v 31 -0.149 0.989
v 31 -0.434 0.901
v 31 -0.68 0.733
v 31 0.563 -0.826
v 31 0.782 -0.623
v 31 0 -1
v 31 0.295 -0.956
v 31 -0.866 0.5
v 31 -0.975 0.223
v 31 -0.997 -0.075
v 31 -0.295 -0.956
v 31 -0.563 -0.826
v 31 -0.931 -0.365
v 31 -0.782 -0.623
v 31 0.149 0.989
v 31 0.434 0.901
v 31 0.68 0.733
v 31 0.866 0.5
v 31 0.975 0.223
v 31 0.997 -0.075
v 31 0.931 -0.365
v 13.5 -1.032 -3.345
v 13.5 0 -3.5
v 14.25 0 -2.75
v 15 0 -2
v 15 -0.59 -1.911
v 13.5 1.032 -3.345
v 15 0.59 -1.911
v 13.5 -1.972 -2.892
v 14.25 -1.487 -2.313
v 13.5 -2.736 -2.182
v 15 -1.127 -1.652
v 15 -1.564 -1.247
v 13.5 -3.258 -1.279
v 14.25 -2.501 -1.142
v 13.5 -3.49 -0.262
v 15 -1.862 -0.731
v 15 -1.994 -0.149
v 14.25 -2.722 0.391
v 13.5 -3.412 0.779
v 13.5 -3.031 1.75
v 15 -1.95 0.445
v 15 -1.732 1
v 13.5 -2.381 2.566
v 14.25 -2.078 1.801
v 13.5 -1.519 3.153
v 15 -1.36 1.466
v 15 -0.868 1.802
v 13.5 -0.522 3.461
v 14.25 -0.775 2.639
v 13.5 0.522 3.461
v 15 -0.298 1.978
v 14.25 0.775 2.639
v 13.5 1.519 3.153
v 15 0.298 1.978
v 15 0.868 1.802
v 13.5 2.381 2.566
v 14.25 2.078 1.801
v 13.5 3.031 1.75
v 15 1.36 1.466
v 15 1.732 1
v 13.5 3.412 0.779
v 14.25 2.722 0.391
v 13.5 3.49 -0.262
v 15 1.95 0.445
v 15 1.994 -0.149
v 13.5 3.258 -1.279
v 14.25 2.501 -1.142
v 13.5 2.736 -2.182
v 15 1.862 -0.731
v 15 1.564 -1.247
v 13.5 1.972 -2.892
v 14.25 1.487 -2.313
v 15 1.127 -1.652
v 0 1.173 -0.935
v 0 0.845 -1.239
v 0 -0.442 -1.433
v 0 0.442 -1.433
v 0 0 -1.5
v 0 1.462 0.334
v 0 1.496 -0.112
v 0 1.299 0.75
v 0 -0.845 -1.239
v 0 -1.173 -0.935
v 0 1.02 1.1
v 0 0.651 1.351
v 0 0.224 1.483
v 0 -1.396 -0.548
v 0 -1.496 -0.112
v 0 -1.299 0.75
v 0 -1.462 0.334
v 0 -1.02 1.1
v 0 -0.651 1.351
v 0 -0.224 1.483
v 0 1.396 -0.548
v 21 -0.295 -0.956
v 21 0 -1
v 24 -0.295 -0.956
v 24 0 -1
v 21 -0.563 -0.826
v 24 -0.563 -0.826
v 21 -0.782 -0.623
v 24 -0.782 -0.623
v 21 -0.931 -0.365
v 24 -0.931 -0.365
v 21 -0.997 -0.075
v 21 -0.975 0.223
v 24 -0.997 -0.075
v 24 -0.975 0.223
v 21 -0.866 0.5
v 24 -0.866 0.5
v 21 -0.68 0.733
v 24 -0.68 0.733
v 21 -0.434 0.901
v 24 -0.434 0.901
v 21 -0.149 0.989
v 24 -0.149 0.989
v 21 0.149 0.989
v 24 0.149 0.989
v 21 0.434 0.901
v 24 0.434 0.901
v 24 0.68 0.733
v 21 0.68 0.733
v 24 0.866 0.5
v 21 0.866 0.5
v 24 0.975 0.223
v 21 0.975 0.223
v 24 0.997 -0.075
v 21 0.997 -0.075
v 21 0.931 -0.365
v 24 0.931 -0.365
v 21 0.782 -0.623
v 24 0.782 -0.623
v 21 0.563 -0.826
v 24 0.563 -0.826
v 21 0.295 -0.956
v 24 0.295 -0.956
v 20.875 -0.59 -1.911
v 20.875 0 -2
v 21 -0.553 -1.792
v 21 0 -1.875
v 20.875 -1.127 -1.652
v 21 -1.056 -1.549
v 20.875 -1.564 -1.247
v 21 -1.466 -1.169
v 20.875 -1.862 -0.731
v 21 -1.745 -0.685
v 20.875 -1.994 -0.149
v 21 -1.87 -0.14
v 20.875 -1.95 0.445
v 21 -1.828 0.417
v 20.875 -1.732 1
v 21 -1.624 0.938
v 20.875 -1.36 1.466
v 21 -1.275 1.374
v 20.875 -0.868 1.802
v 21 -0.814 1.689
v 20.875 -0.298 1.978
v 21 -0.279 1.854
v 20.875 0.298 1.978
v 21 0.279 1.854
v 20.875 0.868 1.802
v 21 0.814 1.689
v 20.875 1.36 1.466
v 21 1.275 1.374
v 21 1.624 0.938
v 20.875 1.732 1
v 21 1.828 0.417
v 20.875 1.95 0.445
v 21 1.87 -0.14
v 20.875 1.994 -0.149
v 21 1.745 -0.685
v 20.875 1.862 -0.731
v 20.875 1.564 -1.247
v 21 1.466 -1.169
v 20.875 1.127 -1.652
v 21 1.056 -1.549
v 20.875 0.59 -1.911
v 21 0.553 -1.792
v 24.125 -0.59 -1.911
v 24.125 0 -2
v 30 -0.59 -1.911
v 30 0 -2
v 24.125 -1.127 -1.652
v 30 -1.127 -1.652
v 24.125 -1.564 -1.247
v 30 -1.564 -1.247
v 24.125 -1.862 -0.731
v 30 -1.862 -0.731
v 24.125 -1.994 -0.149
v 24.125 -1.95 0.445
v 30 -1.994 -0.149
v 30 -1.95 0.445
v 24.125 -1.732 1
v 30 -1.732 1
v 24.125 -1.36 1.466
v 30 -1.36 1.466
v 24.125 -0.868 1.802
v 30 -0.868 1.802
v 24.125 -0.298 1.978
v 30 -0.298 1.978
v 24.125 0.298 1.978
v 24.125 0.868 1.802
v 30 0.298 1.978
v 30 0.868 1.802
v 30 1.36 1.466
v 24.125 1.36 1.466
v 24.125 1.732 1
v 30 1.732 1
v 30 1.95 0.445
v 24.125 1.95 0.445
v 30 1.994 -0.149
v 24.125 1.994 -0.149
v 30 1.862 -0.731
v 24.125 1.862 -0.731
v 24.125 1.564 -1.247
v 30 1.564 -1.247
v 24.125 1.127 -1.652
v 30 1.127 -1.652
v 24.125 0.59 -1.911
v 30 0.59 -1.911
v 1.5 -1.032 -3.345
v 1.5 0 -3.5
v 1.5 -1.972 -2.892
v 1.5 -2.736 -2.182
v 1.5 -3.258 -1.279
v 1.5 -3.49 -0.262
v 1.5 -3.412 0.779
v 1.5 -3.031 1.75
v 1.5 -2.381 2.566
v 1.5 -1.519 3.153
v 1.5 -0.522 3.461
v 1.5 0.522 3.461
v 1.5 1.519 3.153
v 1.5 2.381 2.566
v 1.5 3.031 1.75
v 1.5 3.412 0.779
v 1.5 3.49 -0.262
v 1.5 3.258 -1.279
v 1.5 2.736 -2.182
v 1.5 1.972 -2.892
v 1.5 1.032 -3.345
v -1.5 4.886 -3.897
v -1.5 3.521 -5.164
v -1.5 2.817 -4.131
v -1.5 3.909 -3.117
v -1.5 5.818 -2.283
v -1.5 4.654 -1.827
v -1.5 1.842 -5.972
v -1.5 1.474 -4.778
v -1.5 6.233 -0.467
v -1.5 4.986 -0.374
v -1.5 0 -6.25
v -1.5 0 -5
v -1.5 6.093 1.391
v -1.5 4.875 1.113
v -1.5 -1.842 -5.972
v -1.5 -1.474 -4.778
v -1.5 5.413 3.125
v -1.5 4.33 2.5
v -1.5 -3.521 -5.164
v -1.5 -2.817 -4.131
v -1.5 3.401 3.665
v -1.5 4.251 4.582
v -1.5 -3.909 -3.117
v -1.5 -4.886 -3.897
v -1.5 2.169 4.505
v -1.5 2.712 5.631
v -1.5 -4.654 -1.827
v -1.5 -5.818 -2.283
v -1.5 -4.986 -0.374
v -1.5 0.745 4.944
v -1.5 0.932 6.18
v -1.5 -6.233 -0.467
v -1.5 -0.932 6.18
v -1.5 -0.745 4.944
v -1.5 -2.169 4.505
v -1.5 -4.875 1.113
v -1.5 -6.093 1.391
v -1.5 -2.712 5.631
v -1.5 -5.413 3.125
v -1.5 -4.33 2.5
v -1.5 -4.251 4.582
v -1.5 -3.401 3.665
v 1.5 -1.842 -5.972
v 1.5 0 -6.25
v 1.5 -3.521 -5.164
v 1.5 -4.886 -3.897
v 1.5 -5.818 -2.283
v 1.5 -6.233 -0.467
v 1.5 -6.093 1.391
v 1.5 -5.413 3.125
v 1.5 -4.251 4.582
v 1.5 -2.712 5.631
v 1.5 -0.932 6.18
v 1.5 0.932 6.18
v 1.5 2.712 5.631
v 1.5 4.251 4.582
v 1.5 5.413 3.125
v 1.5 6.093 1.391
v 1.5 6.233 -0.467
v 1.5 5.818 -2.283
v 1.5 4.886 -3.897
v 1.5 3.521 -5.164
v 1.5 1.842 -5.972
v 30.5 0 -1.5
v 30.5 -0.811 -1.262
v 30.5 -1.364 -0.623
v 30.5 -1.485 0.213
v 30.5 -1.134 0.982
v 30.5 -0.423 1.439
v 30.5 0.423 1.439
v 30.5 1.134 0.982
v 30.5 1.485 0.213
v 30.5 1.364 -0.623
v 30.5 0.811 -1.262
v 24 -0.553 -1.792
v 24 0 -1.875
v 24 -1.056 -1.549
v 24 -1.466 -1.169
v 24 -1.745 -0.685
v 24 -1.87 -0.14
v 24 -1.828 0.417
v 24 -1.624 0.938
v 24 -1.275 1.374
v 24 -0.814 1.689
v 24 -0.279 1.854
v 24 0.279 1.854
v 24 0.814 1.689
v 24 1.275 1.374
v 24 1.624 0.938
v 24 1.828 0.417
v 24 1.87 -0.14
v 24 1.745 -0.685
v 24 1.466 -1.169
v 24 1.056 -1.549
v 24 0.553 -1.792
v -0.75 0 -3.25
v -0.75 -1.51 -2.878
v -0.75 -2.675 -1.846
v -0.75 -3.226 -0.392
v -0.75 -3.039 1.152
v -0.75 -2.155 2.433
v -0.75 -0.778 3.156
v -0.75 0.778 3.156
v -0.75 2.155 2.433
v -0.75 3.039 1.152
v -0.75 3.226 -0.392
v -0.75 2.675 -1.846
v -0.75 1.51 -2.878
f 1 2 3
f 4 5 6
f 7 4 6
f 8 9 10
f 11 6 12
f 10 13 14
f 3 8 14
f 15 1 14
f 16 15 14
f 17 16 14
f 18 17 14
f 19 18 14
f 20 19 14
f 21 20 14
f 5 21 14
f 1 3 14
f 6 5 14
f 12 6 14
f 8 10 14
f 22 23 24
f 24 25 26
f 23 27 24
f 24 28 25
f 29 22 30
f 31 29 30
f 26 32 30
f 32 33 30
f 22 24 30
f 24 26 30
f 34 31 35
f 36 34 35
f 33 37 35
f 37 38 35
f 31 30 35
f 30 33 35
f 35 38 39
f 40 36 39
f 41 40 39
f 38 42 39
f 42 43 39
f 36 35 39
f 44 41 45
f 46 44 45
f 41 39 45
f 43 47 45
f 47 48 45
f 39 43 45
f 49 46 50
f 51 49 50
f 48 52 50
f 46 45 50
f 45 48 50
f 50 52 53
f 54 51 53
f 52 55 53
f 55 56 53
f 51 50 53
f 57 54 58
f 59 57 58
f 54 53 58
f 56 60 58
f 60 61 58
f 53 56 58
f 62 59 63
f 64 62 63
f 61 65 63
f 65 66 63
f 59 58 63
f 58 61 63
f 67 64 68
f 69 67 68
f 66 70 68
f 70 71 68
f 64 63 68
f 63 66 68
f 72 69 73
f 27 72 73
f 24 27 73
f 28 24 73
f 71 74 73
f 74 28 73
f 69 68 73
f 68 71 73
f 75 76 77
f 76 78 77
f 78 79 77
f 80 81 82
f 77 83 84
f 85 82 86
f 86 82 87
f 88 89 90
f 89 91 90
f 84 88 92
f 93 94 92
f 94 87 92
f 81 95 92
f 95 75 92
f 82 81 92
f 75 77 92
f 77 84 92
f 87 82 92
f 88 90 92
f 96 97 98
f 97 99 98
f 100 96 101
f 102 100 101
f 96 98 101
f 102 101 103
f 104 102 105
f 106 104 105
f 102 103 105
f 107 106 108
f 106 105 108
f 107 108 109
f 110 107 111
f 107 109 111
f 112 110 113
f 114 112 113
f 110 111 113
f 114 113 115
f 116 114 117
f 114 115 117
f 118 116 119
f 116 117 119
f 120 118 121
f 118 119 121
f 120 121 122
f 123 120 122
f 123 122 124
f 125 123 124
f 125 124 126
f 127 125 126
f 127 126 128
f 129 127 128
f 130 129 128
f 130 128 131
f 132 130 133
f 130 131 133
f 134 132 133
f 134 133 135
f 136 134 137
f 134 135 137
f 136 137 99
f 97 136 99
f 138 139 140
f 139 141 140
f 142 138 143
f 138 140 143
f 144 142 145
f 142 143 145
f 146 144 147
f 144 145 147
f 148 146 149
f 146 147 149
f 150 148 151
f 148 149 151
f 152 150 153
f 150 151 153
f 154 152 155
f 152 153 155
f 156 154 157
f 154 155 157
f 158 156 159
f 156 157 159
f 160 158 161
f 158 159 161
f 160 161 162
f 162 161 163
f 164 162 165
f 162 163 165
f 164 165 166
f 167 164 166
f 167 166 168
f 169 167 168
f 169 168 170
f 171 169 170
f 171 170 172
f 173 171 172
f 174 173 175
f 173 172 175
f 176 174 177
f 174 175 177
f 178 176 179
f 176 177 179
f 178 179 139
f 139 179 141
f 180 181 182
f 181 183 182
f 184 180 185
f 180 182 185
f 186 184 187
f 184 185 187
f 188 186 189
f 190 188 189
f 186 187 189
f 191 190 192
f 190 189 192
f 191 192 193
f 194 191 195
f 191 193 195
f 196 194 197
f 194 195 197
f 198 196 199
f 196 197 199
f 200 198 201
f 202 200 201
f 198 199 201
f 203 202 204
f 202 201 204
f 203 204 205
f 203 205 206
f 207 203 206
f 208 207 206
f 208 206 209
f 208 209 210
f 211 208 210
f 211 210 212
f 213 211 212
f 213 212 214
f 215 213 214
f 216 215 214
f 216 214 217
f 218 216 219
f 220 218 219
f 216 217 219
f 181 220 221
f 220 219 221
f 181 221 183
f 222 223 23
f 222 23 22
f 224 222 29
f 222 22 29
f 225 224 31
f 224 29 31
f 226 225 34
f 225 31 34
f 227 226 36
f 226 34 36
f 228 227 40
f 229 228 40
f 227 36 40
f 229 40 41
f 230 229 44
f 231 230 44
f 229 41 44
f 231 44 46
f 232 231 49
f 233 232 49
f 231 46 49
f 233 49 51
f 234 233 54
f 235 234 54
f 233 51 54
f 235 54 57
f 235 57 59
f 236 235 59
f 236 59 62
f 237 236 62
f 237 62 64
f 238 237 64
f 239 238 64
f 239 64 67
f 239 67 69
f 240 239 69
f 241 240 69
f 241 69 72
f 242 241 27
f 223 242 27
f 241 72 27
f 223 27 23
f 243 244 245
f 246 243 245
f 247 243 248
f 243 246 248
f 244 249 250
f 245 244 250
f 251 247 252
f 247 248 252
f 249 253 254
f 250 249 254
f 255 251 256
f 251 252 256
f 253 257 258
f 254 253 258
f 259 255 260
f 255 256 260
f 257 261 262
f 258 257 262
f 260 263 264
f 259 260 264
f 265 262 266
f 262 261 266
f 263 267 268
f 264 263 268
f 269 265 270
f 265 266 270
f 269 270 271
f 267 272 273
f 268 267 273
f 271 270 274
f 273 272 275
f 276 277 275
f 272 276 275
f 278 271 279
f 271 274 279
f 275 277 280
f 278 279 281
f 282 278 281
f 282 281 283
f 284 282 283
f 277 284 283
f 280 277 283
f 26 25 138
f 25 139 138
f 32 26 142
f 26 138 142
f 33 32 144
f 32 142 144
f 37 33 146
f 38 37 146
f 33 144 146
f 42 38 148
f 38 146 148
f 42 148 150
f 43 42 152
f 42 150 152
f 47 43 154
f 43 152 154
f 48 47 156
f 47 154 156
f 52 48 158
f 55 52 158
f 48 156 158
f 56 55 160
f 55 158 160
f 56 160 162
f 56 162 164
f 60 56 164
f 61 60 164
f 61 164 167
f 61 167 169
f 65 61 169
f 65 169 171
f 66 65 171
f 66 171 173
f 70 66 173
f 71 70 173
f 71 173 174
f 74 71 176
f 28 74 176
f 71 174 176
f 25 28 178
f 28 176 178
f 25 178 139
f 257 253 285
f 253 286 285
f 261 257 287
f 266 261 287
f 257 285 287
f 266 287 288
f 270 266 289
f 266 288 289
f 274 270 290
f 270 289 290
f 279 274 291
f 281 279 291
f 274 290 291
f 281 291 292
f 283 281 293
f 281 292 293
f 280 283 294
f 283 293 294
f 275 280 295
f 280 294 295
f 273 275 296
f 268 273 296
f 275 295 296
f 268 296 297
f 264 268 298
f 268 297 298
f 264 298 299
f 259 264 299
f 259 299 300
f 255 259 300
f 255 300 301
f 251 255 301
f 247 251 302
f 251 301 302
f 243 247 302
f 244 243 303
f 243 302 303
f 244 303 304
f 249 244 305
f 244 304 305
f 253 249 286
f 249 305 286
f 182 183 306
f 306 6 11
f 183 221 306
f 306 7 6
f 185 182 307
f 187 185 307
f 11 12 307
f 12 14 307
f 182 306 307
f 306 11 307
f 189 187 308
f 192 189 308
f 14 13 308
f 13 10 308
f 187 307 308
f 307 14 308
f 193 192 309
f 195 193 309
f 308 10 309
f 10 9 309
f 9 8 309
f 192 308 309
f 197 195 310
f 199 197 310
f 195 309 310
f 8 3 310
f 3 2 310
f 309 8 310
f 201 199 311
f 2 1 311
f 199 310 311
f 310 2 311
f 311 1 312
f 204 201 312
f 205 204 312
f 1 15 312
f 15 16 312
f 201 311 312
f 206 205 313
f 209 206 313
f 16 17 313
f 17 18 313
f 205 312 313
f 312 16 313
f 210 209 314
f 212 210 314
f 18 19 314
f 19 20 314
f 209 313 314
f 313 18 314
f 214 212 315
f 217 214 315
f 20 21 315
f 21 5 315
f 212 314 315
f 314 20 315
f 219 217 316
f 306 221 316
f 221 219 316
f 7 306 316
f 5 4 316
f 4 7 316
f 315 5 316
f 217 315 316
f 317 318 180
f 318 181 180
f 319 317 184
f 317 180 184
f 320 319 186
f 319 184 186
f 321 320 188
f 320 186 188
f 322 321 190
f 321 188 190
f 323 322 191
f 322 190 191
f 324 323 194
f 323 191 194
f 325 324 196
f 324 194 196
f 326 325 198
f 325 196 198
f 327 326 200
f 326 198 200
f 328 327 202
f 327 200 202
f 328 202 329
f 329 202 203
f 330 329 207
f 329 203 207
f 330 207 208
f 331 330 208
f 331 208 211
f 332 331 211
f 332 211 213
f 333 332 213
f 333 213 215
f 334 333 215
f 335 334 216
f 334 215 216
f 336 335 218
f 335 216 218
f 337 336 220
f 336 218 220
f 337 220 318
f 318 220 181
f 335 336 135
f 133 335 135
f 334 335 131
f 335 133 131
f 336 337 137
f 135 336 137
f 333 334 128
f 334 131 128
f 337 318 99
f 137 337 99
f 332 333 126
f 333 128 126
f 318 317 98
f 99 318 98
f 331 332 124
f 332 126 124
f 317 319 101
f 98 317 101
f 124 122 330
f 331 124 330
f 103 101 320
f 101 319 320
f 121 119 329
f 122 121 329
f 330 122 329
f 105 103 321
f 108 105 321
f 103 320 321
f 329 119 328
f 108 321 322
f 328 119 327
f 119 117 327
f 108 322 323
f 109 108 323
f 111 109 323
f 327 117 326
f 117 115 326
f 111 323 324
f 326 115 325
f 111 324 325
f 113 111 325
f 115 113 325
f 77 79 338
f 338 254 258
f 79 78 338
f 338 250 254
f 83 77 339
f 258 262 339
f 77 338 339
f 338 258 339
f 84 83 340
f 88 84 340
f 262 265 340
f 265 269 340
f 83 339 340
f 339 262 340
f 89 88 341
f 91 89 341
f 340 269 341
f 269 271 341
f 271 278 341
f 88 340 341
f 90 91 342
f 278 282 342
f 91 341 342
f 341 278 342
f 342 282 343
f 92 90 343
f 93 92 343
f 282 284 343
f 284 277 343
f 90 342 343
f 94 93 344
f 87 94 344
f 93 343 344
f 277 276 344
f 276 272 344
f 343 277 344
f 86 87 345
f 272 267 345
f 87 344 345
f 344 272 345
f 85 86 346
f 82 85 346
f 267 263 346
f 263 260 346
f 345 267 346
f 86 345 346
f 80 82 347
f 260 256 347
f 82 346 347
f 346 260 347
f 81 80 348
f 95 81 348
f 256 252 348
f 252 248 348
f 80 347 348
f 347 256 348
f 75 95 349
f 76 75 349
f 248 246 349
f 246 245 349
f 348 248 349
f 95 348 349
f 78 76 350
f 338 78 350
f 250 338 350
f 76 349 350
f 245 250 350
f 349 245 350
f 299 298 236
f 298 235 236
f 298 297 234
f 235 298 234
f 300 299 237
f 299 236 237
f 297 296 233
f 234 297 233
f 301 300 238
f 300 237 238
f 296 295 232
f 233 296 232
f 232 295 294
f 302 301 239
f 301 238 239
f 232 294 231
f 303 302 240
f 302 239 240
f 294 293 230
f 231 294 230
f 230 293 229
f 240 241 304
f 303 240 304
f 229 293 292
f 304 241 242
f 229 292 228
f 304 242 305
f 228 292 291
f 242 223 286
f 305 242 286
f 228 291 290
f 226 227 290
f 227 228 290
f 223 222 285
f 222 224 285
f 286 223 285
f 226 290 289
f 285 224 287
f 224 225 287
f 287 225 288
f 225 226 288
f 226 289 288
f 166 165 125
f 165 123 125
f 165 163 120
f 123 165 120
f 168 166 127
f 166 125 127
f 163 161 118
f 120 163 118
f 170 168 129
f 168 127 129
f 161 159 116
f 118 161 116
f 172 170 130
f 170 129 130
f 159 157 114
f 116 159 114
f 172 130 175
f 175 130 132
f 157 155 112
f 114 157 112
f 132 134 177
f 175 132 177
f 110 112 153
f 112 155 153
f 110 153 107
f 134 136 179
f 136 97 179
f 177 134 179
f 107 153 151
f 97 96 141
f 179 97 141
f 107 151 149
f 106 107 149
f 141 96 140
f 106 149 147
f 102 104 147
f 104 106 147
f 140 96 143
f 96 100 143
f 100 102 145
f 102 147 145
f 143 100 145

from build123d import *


with BuildPart() as part:
    # Sketch1 → Revolve1 (revolve)
    with BuildSketch(Plane.XY, mode=Mode.PRIVATE) as revolve1_sk:
        Polygon((0, 0), (0, 1.5), (-1.5, 5), (-1.5, 6.25), (1.5, 6.25), (1.5, 3.5), (13.5, 3.5), (15, 2), (20.875, 2), (21, 1.875), (21, 1), (24, 1), (24, 1.875), (24.125, 2), (30, 2), (31, 1), (31, 0), align=None)
    revolve(revolve1_sk.sketch.rotate(Axis((31, 0, 0), (-1, 0, 0)), 90), axis=Axis((31, 0, 0), (-1, 0, 0)))


solid = part.part
